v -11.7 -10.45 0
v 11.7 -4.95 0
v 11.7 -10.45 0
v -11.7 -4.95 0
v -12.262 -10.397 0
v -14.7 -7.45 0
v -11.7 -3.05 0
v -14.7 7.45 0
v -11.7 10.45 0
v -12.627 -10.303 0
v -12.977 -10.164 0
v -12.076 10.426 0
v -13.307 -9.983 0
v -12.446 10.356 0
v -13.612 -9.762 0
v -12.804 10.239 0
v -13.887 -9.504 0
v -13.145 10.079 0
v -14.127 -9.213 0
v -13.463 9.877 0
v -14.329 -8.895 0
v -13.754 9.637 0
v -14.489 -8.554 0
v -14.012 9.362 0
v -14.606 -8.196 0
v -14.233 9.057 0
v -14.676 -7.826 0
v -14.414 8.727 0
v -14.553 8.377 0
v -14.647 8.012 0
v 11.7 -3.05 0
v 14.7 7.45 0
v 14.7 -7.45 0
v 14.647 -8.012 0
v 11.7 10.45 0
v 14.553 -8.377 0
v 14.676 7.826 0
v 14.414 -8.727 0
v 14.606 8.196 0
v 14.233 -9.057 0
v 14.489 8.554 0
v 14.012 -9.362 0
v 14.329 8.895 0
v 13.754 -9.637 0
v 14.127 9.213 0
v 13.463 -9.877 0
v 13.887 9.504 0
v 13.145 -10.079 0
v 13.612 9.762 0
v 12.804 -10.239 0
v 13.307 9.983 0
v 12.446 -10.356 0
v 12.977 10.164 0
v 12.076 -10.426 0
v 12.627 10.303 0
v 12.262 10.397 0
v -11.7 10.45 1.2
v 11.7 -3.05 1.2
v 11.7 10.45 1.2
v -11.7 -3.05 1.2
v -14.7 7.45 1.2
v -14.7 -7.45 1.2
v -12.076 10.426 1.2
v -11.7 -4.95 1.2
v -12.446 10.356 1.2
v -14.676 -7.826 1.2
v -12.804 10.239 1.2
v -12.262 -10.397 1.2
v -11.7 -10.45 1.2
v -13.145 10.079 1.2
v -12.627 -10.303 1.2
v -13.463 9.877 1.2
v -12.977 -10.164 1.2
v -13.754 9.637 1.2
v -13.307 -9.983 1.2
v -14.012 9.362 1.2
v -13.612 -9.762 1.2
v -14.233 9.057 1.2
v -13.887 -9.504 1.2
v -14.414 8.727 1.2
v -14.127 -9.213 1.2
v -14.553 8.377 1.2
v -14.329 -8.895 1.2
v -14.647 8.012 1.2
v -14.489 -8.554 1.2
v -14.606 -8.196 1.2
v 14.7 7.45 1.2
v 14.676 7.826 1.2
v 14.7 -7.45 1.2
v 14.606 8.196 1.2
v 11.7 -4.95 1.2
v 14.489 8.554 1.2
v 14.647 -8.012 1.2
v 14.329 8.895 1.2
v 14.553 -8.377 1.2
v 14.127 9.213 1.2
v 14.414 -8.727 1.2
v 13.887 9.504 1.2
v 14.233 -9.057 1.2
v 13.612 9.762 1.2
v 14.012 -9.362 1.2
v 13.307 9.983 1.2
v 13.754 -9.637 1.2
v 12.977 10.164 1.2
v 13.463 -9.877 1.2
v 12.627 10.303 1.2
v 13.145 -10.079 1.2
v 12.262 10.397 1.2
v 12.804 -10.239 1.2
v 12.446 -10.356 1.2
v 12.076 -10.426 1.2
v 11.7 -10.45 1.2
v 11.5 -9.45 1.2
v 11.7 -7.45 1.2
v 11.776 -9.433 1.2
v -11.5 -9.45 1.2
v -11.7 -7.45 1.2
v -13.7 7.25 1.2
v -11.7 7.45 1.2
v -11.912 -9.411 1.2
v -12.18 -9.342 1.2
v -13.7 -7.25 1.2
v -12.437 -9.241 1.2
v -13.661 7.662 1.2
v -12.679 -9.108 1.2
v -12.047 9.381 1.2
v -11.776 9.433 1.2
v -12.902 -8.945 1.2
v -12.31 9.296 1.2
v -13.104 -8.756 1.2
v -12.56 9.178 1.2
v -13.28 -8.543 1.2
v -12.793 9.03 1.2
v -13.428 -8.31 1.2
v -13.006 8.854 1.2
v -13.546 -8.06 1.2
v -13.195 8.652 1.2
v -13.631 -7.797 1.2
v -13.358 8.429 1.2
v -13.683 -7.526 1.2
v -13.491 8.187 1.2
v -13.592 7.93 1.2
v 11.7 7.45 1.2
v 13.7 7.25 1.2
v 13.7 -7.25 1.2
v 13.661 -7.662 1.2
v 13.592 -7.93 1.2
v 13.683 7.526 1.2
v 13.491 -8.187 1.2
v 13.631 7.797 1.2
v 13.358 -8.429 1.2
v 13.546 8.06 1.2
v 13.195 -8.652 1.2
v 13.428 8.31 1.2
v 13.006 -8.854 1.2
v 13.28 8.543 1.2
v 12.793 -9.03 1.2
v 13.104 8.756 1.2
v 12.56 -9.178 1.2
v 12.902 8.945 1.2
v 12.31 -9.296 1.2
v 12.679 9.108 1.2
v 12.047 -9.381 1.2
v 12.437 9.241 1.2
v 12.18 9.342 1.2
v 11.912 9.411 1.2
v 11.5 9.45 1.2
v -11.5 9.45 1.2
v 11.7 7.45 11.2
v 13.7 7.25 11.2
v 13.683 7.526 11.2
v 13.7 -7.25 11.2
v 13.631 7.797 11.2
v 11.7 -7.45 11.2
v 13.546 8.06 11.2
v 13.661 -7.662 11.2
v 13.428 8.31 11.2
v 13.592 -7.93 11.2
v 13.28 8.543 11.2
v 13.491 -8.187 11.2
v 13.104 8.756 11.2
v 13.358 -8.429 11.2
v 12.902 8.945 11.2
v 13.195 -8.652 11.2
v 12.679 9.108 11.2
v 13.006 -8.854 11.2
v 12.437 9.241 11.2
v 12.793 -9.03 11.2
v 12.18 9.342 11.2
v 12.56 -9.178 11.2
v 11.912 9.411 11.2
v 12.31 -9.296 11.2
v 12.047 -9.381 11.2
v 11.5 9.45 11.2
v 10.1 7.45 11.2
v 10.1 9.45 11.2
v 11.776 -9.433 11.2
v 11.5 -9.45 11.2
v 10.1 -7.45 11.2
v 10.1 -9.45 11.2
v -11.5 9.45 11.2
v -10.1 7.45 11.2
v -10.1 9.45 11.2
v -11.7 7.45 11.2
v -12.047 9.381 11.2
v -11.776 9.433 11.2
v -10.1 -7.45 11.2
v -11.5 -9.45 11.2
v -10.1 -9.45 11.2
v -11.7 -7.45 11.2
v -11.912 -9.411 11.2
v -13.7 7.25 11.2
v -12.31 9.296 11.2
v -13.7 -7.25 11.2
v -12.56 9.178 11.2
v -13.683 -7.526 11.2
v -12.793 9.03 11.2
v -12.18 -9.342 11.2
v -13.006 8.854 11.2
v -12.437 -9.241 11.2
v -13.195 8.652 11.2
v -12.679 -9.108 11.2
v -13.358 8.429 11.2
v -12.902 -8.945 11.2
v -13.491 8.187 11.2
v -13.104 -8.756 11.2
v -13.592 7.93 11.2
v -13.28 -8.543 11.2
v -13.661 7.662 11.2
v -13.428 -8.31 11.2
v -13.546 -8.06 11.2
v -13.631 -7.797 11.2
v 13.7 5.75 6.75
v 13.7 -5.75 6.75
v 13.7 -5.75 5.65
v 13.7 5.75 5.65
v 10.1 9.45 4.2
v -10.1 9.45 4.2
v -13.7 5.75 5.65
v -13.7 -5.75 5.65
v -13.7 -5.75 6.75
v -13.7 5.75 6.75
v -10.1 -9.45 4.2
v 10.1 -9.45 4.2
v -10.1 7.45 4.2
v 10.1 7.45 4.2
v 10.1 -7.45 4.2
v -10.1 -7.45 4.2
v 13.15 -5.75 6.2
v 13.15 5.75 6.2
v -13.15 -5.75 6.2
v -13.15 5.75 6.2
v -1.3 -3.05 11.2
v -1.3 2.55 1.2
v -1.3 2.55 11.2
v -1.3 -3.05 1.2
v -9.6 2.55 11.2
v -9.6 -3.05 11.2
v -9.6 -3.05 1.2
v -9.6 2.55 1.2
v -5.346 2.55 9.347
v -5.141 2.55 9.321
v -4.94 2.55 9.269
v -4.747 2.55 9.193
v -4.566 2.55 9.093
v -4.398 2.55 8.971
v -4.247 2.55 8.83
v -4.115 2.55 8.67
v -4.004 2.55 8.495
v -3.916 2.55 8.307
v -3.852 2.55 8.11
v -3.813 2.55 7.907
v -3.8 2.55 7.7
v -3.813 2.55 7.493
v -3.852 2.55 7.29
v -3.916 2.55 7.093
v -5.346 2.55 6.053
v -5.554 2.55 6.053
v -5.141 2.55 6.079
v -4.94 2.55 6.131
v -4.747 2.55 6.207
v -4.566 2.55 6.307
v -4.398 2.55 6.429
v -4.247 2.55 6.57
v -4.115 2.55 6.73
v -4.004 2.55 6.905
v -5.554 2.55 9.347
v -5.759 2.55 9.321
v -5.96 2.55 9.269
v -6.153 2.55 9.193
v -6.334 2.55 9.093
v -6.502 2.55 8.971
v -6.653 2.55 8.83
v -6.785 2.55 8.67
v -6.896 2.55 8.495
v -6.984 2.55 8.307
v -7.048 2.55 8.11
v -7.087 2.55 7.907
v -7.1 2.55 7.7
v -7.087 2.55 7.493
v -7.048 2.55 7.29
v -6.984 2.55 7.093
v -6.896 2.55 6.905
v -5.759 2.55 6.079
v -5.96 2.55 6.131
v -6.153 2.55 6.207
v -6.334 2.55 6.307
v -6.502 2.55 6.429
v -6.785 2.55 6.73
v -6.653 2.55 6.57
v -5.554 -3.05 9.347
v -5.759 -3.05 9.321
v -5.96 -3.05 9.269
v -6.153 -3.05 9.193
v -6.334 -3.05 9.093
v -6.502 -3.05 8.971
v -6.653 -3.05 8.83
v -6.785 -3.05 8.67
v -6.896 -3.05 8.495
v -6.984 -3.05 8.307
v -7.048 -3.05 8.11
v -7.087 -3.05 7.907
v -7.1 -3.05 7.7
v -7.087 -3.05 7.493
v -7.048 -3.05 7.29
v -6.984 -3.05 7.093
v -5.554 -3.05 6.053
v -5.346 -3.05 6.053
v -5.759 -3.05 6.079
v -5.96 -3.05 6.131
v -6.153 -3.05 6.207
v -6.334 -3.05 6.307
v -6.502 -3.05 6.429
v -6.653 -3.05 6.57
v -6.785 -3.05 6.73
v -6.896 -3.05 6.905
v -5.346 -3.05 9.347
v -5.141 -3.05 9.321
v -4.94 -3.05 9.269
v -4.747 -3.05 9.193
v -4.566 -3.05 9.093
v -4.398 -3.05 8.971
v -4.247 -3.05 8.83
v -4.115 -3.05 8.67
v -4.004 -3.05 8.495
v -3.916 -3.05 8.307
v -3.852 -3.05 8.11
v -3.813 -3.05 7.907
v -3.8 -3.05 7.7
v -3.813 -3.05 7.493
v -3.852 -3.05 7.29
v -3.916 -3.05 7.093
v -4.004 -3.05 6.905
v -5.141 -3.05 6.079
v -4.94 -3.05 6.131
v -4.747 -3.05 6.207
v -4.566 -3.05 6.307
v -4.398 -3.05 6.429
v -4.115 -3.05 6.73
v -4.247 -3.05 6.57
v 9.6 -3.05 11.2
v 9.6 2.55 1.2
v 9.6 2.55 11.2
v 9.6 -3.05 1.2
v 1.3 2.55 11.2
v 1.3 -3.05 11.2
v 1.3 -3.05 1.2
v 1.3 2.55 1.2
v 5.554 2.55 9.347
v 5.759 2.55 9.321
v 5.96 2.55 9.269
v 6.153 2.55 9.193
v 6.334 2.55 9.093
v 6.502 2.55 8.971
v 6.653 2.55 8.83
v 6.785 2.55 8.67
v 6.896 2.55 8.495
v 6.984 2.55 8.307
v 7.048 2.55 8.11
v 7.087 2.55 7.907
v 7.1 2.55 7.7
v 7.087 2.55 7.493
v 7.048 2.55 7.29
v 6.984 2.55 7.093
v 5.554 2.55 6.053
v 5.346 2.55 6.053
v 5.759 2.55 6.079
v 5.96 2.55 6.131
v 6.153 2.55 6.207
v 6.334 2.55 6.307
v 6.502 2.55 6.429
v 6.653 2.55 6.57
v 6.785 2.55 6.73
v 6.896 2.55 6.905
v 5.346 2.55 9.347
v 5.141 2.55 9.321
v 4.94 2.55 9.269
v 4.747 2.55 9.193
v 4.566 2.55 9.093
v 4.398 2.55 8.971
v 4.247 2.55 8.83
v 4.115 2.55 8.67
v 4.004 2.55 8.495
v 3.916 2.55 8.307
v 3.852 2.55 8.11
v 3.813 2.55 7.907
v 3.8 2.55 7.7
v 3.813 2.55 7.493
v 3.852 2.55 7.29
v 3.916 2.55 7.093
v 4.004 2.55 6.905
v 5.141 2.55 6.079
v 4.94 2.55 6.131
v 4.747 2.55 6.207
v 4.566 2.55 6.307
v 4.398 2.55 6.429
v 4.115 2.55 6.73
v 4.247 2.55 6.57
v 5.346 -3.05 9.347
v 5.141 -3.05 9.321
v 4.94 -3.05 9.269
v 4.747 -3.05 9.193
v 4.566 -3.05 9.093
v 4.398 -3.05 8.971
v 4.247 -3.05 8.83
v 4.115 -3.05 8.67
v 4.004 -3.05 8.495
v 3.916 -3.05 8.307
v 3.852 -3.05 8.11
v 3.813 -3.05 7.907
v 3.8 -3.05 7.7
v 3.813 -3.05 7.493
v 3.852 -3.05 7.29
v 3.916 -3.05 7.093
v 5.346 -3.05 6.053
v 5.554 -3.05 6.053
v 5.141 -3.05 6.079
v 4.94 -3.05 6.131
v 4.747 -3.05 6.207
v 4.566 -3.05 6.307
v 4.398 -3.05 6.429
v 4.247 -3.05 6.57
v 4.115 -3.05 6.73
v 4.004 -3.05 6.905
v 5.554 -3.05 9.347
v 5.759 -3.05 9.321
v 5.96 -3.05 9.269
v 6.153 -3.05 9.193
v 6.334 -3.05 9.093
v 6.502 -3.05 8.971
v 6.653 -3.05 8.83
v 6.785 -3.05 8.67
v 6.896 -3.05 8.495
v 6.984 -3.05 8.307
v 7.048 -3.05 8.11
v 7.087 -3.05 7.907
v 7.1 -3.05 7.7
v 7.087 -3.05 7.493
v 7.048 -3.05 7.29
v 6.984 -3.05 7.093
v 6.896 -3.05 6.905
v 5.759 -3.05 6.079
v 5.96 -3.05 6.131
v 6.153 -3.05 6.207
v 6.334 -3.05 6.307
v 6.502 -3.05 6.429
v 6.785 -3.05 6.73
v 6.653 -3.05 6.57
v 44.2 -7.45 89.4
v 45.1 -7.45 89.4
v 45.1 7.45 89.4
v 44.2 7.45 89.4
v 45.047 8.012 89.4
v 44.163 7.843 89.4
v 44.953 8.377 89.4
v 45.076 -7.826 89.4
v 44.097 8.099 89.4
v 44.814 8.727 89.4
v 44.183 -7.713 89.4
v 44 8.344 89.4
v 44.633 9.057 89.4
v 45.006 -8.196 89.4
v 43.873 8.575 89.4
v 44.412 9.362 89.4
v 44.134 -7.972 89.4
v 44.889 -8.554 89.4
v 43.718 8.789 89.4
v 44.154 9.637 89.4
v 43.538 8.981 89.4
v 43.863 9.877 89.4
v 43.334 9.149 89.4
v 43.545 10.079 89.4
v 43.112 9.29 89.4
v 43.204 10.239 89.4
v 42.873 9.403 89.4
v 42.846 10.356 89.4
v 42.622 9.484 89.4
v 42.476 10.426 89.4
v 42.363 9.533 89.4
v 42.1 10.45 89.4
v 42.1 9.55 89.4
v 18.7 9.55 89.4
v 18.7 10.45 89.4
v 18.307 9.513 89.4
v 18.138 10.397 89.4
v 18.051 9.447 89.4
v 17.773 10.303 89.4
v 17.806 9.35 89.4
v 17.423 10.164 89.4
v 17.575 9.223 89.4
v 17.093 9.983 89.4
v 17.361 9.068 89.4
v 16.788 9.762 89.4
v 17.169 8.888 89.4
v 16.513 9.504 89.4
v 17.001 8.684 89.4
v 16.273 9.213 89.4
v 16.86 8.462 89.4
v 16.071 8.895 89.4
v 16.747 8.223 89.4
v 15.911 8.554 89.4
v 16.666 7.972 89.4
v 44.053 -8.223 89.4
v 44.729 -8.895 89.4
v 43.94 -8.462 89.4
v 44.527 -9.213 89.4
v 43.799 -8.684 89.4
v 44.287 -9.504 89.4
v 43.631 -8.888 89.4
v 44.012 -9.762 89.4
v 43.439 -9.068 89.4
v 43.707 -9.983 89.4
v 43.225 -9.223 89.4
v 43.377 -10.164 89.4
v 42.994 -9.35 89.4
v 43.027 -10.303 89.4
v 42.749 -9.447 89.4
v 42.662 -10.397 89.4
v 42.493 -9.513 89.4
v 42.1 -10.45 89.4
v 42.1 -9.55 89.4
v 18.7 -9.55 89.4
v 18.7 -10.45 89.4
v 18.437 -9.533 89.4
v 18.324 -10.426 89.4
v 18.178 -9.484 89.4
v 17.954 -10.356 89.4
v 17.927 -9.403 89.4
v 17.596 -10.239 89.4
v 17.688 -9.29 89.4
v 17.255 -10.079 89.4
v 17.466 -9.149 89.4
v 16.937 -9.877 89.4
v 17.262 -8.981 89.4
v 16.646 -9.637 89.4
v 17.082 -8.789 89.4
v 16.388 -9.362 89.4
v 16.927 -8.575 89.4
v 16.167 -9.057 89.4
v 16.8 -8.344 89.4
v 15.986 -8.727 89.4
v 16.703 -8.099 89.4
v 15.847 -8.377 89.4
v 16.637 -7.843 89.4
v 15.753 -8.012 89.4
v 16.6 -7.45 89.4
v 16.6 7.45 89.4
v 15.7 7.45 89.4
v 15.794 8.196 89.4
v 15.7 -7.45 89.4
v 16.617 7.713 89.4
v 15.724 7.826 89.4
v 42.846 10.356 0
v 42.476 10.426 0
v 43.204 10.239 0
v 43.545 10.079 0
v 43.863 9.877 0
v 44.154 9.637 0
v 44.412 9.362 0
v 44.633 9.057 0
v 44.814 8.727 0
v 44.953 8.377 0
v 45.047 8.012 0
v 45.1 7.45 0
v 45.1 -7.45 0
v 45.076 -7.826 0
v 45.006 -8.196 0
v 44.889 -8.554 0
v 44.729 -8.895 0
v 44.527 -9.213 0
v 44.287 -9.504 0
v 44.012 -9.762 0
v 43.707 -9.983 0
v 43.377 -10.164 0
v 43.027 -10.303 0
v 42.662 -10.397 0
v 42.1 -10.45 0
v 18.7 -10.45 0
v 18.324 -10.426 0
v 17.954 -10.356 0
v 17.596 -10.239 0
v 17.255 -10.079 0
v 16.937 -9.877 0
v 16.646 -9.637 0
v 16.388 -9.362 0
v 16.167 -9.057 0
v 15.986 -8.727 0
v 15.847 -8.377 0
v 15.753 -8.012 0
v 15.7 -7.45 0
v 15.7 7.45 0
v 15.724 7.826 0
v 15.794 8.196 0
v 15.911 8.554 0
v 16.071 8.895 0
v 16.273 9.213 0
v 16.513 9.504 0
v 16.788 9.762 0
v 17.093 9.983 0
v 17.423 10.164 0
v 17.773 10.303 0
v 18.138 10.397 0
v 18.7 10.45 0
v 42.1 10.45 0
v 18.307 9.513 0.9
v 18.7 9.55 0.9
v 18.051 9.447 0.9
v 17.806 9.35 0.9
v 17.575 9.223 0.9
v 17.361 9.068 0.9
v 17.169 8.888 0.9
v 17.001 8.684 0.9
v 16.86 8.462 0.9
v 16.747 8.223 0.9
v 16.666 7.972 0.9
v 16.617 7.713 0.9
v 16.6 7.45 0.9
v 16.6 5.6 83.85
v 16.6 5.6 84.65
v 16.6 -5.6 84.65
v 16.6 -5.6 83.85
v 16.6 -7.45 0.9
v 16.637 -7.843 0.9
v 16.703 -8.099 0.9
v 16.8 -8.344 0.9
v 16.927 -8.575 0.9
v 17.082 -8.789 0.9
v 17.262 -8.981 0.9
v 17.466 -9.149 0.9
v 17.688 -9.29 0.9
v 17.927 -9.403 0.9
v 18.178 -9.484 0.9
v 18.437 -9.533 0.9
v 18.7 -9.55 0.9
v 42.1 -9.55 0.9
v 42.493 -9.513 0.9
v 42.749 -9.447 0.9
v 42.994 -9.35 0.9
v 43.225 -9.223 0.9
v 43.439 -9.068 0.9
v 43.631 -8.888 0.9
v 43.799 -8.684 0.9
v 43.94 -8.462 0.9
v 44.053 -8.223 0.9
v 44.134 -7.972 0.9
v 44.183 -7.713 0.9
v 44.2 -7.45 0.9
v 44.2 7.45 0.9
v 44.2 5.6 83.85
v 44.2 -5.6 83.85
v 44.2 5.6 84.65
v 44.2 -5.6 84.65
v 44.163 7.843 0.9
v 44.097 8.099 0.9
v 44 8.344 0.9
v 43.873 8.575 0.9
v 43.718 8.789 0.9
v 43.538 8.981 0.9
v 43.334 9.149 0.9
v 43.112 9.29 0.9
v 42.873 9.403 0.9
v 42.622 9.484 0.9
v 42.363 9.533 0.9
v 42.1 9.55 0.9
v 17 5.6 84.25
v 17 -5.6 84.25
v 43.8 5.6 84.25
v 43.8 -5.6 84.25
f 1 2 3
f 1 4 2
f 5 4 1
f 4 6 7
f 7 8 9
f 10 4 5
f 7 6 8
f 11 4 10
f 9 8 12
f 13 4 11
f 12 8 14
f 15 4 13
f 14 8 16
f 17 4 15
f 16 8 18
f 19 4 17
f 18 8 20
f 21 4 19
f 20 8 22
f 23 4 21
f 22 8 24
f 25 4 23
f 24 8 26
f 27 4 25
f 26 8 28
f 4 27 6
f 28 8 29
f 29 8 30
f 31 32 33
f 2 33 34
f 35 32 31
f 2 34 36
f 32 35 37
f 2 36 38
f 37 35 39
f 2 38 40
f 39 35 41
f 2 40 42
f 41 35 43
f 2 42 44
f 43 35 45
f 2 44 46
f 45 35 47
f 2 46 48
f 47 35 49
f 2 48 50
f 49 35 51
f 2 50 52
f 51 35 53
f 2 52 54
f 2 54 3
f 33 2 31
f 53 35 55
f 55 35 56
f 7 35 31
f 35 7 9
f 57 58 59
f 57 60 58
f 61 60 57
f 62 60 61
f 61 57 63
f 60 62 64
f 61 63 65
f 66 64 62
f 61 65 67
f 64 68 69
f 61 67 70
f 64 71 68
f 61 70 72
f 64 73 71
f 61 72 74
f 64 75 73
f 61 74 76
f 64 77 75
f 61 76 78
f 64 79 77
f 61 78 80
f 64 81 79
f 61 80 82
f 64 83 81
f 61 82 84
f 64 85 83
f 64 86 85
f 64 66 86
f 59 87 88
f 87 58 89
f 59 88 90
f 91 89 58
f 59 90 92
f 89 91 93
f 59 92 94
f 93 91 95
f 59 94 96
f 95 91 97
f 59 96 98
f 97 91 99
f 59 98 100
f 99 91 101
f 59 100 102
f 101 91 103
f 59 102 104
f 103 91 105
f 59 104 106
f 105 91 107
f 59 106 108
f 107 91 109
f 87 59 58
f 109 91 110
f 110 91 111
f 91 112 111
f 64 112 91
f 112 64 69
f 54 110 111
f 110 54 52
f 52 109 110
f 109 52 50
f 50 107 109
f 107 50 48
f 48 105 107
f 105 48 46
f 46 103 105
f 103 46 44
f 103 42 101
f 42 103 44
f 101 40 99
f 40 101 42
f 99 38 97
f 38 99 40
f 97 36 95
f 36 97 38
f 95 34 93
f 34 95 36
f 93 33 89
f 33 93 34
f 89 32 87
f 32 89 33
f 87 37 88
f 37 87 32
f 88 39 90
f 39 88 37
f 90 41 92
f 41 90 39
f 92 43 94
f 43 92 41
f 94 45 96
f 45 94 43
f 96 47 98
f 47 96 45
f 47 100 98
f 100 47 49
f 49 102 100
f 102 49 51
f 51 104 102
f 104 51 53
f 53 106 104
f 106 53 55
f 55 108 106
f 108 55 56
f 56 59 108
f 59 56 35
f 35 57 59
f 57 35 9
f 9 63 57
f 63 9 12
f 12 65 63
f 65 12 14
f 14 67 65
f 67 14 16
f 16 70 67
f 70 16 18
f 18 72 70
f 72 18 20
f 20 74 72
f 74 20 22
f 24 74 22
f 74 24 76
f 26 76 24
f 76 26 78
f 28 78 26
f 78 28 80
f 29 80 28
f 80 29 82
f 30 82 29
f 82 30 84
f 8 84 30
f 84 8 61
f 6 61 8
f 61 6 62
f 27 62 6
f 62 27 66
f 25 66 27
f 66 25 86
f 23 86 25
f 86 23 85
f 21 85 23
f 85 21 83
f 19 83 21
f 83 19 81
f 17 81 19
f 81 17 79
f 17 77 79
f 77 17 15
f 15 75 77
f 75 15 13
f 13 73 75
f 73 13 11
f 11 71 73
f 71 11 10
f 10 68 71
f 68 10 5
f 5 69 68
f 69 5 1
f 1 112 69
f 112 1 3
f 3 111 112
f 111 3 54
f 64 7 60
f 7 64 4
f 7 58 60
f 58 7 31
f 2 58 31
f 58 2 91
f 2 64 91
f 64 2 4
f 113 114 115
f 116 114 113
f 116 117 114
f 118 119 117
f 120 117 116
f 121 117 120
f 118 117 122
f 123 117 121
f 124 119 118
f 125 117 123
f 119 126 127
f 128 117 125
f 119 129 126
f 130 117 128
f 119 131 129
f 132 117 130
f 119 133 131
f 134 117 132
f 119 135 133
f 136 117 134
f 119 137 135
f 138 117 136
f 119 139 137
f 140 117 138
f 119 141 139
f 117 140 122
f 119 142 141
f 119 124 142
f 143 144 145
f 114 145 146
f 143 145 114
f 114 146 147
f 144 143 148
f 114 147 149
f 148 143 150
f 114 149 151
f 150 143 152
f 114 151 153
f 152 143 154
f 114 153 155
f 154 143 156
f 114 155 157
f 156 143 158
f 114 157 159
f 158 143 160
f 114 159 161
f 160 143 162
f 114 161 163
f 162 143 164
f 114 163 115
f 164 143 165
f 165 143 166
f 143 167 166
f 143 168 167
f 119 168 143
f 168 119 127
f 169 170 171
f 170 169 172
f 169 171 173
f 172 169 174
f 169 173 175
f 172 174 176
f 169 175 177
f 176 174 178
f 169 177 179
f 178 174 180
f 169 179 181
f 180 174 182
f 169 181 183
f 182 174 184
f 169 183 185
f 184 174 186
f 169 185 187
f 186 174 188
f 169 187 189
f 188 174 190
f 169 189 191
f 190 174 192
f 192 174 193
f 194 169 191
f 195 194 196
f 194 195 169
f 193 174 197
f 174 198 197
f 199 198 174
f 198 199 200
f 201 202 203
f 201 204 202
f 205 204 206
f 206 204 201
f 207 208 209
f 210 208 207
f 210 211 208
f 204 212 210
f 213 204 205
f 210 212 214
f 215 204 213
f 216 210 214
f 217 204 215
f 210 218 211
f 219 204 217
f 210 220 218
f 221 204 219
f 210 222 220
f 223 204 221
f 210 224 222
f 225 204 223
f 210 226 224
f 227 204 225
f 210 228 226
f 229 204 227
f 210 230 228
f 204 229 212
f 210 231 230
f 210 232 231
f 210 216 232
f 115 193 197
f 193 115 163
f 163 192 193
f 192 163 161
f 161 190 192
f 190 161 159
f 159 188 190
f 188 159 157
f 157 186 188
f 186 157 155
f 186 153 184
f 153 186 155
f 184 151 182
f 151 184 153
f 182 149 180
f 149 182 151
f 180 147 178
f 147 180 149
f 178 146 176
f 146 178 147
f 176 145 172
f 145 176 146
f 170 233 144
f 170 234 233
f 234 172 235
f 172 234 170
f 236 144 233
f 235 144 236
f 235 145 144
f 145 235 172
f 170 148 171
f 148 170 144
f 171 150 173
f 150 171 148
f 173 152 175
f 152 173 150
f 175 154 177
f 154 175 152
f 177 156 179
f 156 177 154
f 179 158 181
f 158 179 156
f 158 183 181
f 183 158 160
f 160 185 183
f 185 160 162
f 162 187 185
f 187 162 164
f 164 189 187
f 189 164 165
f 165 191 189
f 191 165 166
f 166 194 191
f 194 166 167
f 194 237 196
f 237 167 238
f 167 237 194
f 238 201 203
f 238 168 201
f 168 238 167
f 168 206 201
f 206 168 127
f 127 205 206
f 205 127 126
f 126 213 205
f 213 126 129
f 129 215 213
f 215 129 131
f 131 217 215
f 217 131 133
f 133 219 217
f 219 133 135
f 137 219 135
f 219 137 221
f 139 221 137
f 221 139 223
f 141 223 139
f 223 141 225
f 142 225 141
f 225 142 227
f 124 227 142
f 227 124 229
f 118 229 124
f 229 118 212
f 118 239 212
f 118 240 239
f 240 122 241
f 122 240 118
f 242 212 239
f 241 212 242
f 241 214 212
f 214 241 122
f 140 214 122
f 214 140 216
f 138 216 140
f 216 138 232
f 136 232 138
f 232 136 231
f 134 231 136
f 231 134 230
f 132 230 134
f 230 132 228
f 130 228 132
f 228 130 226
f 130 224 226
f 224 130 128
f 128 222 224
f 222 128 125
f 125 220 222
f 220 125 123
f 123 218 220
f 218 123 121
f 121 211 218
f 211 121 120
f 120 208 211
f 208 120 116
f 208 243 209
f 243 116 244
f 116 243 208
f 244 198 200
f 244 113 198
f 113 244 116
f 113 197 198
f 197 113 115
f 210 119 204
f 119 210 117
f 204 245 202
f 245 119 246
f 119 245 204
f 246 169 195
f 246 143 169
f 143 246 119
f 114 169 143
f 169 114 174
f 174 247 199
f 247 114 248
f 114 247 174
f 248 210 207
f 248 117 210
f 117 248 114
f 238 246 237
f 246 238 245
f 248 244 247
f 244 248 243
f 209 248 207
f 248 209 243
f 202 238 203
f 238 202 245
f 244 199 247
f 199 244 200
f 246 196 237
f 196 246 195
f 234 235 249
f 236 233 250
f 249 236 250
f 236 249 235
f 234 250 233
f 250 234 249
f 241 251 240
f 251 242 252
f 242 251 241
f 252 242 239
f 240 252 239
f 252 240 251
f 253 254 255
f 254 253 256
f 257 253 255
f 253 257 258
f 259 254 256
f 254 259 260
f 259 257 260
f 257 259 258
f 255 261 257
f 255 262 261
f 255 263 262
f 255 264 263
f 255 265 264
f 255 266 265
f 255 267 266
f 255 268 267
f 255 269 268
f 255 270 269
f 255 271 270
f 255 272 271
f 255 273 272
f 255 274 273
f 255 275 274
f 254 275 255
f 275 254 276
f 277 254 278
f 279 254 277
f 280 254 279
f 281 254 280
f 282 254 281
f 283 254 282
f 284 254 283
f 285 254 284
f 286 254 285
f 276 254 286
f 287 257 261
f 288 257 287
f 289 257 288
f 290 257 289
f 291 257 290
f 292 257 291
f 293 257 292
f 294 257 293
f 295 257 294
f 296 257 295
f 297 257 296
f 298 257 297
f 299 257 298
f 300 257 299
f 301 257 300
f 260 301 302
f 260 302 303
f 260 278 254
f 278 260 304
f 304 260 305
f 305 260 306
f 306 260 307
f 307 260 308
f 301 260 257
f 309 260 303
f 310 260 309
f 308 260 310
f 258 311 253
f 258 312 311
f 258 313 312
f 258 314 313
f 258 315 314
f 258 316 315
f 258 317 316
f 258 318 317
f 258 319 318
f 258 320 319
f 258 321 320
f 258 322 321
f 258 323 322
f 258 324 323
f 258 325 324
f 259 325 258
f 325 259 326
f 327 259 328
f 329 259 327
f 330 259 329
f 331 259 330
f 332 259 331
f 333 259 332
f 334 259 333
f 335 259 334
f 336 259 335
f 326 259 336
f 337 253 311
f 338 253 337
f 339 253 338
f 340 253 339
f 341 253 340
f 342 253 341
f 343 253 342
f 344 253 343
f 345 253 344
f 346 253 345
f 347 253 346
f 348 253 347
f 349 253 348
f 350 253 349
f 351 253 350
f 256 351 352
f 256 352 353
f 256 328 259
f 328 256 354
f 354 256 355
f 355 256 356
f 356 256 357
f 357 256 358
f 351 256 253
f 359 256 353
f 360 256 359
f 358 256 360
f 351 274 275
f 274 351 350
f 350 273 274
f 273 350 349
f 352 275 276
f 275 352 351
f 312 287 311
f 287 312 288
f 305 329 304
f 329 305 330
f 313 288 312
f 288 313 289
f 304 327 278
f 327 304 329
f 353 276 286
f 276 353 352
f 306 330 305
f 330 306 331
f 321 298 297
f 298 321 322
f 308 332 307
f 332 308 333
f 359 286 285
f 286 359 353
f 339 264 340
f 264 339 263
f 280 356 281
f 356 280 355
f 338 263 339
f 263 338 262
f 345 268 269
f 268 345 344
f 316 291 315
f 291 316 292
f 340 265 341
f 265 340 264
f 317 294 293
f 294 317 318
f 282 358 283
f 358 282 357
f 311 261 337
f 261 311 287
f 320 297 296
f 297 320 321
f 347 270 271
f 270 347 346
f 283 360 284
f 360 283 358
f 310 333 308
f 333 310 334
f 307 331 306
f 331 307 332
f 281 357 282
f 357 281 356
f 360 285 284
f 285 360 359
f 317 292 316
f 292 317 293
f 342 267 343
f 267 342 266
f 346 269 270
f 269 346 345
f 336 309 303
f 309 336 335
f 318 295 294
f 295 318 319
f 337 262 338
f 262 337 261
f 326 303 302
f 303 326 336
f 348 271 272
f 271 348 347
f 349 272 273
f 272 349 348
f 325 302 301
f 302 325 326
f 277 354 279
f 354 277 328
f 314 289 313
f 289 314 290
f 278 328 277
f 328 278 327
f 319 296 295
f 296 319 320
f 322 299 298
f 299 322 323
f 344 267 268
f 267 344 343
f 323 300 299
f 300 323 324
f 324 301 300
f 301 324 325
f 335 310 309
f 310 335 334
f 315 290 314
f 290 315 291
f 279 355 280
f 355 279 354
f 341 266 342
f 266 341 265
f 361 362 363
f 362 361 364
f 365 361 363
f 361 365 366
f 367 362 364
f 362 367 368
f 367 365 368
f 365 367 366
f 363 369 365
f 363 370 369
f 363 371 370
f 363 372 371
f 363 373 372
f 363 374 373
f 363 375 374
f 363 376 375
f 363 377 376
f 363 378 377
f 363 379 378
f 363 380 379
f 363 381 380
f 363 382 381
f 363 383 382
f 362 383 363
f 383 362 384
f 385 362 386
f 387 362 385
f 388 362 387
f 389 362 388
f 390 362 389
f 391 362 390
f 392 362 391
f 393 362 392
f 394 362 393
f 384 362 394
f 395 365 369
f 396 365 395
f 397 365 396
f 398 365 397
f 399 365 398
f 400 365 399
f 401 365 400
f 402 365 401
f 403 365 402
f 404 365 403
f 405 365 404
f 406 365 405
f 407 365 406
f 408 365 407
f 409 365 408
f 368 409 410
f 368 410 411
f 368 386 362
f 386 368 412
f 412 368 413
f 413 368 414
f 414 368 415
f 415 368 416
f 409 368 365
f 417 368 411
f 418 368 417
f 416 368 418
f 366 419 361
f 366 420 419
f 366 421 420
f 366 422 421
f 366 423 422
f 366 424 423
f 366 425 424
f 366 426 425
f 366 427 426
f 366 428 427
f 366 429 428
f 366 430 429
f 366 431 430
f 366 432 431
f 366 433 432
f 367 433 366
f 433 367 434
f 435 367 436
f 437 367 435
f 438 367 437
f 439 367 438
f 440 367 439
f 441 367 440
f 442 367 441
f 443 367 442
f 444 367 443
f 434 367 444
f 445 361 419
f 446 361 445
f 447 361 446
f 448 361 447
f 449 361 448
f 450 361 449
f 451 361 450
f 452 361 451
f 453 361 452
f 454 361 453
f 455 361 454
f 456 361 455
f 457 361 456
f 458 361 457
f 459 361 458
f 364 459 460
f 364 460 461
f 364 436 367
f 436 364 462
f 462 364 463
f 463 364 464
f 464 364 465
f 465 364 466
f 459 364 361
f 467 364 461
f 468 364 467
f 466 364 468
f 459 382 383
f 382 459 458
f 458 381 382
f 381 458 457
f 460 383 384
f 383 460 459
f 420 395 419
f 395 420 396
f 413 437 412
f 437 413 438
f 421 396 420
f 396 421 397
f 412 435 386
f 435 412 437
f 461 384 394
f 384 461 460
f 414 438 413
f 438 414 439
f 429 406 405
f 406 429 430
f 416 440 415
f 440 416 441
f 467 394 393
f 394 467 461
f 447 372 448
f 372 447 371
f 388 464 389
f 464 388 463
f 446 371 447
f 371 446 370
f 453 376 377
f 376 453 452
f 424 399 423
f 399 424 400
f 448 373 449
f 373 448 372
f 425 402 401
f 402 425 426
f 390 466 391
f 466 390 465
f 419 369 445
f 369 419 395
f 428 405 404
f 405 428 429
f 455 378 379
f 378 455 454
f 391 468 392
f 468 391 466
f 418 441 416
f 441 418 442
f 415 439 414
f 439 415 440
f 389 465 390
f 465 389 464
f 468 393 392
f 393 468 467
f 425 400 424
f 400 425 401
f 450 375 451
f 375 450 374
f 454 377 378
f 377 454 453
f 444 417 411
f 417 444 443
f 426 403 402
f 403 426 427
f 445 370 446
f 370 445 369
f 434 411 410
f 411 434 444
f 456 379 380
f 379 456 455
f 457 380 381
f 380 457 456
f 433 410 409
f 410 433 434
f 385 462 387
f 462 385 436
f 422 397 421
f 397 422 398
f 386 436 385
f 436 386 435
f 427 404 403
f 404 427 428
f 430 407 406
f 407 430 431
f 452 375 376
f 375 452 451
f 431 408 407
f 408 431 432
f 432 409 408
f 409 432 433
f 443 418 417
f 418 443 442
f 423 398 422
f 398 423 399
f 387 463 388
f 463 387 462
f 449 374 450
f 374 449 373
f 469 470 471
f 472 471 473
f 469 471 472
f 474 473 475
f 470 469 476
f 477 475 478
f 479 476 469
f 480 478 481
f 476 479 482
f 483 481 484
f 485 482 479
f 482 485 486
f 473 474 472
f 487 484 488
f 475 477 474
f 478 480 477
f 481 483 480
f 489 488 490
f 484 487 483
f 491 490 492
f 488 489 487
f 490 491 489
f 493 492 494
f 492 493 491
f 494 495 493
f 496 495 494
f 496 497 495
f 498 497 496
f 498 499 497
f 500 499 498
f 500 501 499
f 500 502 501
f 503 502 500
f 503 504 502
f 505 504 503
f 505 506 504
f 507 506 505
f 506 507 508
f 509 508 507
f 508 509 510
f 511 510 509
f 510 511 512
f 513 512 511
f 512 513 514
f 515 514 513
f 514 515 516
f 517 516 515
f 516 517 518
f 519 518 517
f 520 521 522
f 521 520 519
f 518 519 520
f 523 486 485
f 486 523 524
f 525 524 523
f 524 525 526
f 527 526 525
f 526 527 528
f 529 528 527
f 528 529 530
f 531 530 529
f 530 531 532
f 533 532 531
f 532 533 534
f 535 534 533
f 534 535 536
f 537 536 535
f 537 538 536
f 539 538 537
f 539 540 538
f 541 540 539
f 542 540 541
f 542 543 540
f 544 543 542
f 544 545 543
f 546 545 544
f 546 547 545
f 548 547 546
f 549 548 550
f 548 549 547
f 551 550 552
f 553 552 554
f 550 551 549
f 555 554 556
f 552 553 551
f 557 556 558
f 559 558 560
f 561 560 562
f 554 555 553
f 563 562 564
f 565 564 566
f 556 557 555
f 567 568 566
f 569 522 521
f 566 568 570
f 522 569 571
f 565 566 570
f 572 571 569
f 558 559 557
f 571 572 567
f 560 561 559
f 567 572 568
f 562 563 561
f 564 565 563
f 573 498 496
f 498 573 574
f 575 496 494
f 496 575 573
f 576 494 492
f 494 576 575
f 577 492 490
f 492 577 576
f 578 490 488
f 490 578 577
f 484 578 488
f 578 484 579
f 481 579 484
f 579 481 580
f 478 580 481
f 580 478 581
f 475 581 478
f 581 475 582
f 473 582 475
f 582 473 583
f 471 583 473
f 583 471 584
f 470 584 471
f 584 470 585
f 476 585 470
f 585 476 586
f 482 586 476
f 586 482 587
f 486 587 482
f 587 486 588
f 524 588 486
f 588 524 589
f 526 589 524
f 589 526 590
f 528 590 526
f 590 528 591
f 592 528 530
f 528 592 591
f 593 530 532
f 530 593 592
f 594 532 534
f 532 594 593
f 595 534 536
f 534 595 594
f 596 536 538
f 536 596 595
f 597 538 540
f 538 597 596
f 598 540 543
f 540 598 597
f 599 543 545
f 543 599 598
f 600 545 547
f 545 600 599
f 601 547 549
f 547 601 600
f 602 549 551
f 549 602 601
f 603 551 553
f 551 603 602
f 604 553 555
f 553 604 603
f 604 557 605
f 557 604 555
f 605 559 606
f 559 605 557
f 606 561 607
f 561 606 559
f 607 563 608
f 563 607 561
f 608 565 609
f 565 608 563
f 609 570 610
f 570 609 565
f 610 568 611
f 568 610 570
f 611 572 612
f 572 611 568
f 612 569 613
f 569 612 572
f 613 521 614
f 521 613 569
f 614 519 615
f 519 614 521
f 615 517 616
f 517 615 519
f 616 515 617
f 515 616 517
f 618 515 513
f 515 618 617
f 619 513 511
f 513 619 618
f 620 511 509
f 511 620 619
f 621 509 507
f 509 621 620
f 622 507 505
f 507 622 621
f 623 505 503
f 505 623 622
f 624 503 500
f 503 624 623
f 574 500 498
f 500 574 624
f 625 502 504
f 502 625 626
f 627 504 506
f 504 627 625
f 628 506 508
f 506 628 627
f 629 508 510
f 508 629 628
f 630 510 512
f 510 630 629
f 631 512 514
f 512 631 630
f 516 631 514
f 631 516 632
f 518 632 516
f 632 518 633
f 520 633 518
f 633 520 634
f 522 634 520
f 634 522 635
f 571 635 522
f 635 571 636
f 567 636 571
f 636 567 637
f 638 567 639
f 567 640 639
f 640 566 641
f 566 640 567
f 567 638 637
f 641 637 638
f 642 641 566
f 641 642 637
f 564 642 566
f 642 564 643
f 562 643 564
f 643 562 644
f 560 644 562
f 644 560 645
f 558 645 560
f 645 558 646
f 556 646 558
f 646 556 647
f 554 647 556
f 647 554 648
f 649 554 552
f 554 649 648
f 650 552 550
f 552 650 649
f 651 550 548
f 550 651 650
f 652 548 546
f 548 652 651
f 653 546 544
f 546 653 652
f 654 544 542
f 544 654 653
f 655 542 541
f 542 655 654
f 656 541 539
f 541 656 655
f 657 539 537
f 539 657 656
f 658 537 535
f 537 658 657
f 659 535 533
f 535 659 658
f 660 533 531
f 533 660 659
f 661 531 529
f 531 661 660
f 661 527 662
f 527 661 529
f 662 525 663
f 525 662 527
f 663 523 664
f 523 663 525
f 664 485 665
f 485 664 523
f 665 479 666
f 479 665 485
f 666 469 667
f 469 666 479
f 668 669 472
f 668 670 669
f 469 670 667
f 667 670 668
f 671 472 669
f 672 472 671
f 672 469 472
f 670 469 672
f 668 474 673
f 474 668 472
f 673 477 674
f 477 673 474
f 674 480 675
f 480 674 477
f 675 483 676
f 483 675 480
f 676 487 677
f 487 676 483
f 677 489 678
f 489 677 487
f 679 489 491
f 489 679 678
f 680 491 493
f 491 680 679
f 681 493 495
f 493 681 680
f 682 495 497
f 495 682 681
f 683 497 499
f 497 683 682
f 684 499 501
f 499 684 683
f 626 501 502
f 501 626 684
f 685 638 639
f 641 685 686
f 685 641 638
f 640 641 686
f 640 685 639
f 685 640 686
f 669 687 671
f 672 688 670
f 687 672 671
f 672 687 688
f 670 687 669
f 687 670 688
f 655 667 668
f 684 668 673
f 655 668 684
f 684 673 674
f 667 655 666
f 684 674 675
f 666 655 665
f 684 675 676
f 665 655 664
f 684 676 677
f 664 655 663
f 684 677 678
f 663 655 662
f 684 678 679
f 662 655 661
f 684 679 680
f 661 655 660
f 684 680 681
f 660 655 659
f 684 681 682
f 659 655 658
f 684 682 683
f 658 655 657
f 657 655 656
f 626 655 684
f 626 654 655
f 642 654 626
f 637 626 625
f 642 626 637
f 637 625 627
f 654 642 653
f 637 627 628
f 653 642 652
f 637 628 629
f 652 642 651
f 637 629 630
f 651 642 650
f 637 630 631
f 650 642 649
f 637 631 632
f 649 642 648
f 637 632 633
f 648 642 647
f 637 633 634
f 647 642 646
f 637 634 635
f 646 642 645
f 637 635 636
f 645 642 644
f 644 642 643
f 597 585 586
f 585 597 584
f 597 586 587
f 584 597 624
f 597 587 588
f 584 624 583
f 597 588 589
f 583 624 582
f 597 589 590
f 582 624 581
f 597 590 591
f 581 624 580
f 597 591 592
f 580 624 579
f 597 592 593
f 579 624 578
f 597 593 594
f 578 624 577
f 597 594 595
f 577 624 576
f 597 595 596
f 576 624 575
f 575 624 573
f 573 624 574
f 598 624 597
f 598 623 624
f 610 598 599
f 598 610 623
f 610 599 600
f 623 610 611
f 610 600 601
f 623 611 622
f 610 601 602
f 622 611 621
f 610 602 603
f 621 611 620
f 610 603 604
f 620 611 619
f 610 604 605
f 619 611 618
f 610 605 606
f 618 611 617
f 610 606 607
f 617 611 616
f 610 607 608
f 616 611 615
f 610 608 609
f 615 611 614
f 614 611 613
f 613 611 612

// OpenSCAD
$fn=50;

// General
part="all";
release_version="";

// Tolerances
tol=0.15;  // Tolerance for all measurements that need to fit, like screw hole diameter, PCB thickness, etc...
press_fit_tol=0.1;  // Tolerance between the shell and the base

// Wall thicknesses
wall_thickness=0.9;
base_thickness=1.2;

// Text
text_depth=0.5;

// Venting holes
venting_holes=false;
venting_hole_count=5;
venting_hole_dia=2;

// Case dimensions
height=82;  // height of the hole case measured from the center of the mounting screw holes
rim_thickness=2;
rim_height=10;

// Hardware
screw_hole_dia=3;
screw_hole_center_to_post_top = 3.5;
screw_length=10;
nut_thickness=2.4;

// PCB Settings
pcb_thickness=1.6;
pcb_top_depth=10.5;  // space in the case on the top side of the pcb
pcb_bottom_depth=max(2.5, nut_thickness);  // space in the case on the bottom side of the pcb
pcb_width=23.1;
mount_center_from_edge_1=6.1;  // distance to center of left mounting hole when viewed from the top
mount_center_from_edge_2=6.1;  // distance to center of right mounting hole when viewed from the top

// Mounting posts
post_width = 8.3;  // width of the mounting posts
post_height = 10;  // height of the mounting posts
post_depth = max(5, screw_length - pcb_bottom_depth - pcb_thickness - 2 * tol);

// Miscellaneous
fillet_radius=3;

// helper variables
inner_width=pcb_width + 2 * tol;
inner_depth=pcb_top_depth + pcb_bottom_depth + pcb_thickness + 2 * tol;
total_width=inner_width + 2 * wall_thickness + 2 * press_fit_tol + 2 * rim_thickness;
total_depth=inner_depth + 2 * wall_thickness + 2 * press_fit_tol + 2 * rim_thickness;
total_shell_height=height + (post_height - screw_hole_center_to_post_top);

// Edge for the interlocking between shell and base
lock_edge_depth=0.4;
lock_edge_length=inner_depth + 2 * rim_thickness - 2 * (fillet_radius - wall_thickness + press_fit_tol) - 3;

// Locking Edge
module lock_edge(depth=lock_edge_depth, length=lock_edge_length){
    translate([0, -length / 2, depth]) rotate([-90, 0, 0]) linear_extrude(length)
        polygon(points = [[0,0], [depth, depth], [0, 2 * depth]]);
}

// Mount Post
// `pos` is center of bottom front edge
module mounting_post(
    pos=[0, 0, 0],
    width=post_width,
    depth=post_depth,
    height=post_height,
){
    translate(pos - [width / 2, 0, 0])
        difference(){
            cube([width, depth, height]);
            translate([width / 2, -tol, height - screw_hole_center_to_post_top])
                rotate([-90, 0, 0])
                    cylinder(h=depth + 2 * tol, d=screw_hole_dia + 2 * tol);
        };
}

// Base
if(part == "base" || part == "all"){
    difference(){
        union(){
            difference(){
                linear_extrude(base_thickness) difference(){
                    offset(r=fillet_radius) offset(r=-fillet_radius)
                        square(
                                [
                                    total_width,
                                    total_depth,
                                ],
                                center=true
                            );
                        translate([0, wall_thickness + press_fit_tol + rim_thickness + pcb_bottom_depth])
                            translate([0, -total_depth / 2, 0])
                                translate([0, (pcb_thickness + 2 * tol) / 2])
                                    square([pcb_width + 2 * tol, pcb_thickness + 2 * tol], center=true);
                };
                translate([0, total_depth / 2 - (wall_thickness + press_fit_tol + rim_thickness + pcb_top_depth) / 2, text_depth]) rotate([180, 0, 0])
                    linear_extrude(text_depth + 0.1) text(text=release_version, size=max(pcb_top_depth - 4, 4), halign="center", valign="center");
            };
            // Rim
            translate([0, 0, base_thickness])
                difference(){
                    linear_extrude(rim_height)
                        difference(){
                            offset(r=(fillet_radius - wall_thickness + press_fit_tol)) offset(r=-(fillet_radius - wall_thickness + press_fit_tol))
                                square([inner_width + 2 * rim_thickness, inner_depth + 2 * rim_thickness], center=true);
                            square([inner_width, inner_depth], center=true);
                        };
                    translate([0, 0, max(post_height - screw_hole_center_to_post_top - 3.5, 0)])
                        linear_extrude(height=screw_hole_center_to_post_top + 3.5 + 0.1)
                            square(
                                [
                                    pcb_width - ((mount_center_from_edge_1 - post_width / 2) + (mount_center_from_edge_2 - post_width / 2)) + 1,
                                    inner_depth + 2 * rim_thickness + 0.1
                                ],
                                center=true
                            );
                    translate([inner_width / 2 + rim_thickness, 0, rim_height / 2]) rotate([0, 180, 0]) lock_edge(depth=lock_edge_depth + tol);
                    translate([- (inner_width / 2 + rim_thickness), 0, rim_height / 2]) lock_edge(depth=lock_edge_depth + tol);
                }
            mounting_post([
                -pcb_width / 2 + mount_center_from_edge_1,
                -total_depth / 2 + wall_thickness + press_fit_tol + rim_thickness + pcb_bottom_depth + pcb_thickness + 2 * tol,
                base_thickness
            ]);
            mounting_post([
                pcb_width / 2 - mount_center_from_edge_2,
                -total_depth / 2 + wall_thickness + press_fit_tol + rim_thickness + pcb_bottom_depth + pcb_thickness + 2 * tol,
                base_thickness
            ]);
        };
        if(venting_holes){
            translate([-inner_width / 2, total_depth / 2 - wall_thickness - press_fit_tol - rim_thickness - (pcb_top_depth - post_depth) / 2, 0]) linear_extrude(base_thickness)
                for (i = [1:venting_hole_count]) {
                    translate([inner_width / (venting_hole_count + 1) * i, 0, 0]) circle(d=venting_hole_dia);
                }
        }
    };
}



// Shell
if(part == "shell" || part == "all"){
    translate([total_width + 1, 0, base_thickness + wall_thickness + tol + total_shell_height])
        rotate([180, 0, 0])
            difference(){
                union(){
                    translate([0, 0, base_thickness + tol]) union(){
                        linear_extrude(total_shell_height) difference(){
                            offset(r=fillet_radius) offset(r=-fillet_radius) square([total_width, total_depth], center=true);
                            offset(r=(fillet_radius - wall_thickness)) offset(r=-(fillet_radius - wall_thickness))
                                square([total_width - 2 * wall_thickness, total_depth - 2 * wall_thickness], center=true);
                        };
                        translate([-inner_width / 2 - rim_thickness - press_fit_tol, 0, rim_height / 2 + tol])
                            lock_edge(length=lock_edge_length - 2 * tol);
                        translate([+inner_width / 2 + rim_thickness + press_fit_tol, 0, rim_height / 2 + tol]) rotate([0, 180, 0])
                            lock_edge(length=lock_edge_length - 2 * tol);
                    };
                    translate([0, 0, base_thickness + tol + total_shell_height])
                        linear_extrude(wall_thickness)
                            offset(r=fillet_radius) offset(r=-fillet_radius) square([total_width, total_depth], center=true);
                };
                translate(
                    [
                        0,
                        0,
                        base_thickness + tol + total_shell_height + min(text_depth, wall_thickness / 2)
                    ]
                )
                    rotate([180, 0, 0])
                        linear_extrude(text_depth + 0.1) text(text=release_version, size=pcb_top_depth - 3, halign="center", valign="center");
            };
}
